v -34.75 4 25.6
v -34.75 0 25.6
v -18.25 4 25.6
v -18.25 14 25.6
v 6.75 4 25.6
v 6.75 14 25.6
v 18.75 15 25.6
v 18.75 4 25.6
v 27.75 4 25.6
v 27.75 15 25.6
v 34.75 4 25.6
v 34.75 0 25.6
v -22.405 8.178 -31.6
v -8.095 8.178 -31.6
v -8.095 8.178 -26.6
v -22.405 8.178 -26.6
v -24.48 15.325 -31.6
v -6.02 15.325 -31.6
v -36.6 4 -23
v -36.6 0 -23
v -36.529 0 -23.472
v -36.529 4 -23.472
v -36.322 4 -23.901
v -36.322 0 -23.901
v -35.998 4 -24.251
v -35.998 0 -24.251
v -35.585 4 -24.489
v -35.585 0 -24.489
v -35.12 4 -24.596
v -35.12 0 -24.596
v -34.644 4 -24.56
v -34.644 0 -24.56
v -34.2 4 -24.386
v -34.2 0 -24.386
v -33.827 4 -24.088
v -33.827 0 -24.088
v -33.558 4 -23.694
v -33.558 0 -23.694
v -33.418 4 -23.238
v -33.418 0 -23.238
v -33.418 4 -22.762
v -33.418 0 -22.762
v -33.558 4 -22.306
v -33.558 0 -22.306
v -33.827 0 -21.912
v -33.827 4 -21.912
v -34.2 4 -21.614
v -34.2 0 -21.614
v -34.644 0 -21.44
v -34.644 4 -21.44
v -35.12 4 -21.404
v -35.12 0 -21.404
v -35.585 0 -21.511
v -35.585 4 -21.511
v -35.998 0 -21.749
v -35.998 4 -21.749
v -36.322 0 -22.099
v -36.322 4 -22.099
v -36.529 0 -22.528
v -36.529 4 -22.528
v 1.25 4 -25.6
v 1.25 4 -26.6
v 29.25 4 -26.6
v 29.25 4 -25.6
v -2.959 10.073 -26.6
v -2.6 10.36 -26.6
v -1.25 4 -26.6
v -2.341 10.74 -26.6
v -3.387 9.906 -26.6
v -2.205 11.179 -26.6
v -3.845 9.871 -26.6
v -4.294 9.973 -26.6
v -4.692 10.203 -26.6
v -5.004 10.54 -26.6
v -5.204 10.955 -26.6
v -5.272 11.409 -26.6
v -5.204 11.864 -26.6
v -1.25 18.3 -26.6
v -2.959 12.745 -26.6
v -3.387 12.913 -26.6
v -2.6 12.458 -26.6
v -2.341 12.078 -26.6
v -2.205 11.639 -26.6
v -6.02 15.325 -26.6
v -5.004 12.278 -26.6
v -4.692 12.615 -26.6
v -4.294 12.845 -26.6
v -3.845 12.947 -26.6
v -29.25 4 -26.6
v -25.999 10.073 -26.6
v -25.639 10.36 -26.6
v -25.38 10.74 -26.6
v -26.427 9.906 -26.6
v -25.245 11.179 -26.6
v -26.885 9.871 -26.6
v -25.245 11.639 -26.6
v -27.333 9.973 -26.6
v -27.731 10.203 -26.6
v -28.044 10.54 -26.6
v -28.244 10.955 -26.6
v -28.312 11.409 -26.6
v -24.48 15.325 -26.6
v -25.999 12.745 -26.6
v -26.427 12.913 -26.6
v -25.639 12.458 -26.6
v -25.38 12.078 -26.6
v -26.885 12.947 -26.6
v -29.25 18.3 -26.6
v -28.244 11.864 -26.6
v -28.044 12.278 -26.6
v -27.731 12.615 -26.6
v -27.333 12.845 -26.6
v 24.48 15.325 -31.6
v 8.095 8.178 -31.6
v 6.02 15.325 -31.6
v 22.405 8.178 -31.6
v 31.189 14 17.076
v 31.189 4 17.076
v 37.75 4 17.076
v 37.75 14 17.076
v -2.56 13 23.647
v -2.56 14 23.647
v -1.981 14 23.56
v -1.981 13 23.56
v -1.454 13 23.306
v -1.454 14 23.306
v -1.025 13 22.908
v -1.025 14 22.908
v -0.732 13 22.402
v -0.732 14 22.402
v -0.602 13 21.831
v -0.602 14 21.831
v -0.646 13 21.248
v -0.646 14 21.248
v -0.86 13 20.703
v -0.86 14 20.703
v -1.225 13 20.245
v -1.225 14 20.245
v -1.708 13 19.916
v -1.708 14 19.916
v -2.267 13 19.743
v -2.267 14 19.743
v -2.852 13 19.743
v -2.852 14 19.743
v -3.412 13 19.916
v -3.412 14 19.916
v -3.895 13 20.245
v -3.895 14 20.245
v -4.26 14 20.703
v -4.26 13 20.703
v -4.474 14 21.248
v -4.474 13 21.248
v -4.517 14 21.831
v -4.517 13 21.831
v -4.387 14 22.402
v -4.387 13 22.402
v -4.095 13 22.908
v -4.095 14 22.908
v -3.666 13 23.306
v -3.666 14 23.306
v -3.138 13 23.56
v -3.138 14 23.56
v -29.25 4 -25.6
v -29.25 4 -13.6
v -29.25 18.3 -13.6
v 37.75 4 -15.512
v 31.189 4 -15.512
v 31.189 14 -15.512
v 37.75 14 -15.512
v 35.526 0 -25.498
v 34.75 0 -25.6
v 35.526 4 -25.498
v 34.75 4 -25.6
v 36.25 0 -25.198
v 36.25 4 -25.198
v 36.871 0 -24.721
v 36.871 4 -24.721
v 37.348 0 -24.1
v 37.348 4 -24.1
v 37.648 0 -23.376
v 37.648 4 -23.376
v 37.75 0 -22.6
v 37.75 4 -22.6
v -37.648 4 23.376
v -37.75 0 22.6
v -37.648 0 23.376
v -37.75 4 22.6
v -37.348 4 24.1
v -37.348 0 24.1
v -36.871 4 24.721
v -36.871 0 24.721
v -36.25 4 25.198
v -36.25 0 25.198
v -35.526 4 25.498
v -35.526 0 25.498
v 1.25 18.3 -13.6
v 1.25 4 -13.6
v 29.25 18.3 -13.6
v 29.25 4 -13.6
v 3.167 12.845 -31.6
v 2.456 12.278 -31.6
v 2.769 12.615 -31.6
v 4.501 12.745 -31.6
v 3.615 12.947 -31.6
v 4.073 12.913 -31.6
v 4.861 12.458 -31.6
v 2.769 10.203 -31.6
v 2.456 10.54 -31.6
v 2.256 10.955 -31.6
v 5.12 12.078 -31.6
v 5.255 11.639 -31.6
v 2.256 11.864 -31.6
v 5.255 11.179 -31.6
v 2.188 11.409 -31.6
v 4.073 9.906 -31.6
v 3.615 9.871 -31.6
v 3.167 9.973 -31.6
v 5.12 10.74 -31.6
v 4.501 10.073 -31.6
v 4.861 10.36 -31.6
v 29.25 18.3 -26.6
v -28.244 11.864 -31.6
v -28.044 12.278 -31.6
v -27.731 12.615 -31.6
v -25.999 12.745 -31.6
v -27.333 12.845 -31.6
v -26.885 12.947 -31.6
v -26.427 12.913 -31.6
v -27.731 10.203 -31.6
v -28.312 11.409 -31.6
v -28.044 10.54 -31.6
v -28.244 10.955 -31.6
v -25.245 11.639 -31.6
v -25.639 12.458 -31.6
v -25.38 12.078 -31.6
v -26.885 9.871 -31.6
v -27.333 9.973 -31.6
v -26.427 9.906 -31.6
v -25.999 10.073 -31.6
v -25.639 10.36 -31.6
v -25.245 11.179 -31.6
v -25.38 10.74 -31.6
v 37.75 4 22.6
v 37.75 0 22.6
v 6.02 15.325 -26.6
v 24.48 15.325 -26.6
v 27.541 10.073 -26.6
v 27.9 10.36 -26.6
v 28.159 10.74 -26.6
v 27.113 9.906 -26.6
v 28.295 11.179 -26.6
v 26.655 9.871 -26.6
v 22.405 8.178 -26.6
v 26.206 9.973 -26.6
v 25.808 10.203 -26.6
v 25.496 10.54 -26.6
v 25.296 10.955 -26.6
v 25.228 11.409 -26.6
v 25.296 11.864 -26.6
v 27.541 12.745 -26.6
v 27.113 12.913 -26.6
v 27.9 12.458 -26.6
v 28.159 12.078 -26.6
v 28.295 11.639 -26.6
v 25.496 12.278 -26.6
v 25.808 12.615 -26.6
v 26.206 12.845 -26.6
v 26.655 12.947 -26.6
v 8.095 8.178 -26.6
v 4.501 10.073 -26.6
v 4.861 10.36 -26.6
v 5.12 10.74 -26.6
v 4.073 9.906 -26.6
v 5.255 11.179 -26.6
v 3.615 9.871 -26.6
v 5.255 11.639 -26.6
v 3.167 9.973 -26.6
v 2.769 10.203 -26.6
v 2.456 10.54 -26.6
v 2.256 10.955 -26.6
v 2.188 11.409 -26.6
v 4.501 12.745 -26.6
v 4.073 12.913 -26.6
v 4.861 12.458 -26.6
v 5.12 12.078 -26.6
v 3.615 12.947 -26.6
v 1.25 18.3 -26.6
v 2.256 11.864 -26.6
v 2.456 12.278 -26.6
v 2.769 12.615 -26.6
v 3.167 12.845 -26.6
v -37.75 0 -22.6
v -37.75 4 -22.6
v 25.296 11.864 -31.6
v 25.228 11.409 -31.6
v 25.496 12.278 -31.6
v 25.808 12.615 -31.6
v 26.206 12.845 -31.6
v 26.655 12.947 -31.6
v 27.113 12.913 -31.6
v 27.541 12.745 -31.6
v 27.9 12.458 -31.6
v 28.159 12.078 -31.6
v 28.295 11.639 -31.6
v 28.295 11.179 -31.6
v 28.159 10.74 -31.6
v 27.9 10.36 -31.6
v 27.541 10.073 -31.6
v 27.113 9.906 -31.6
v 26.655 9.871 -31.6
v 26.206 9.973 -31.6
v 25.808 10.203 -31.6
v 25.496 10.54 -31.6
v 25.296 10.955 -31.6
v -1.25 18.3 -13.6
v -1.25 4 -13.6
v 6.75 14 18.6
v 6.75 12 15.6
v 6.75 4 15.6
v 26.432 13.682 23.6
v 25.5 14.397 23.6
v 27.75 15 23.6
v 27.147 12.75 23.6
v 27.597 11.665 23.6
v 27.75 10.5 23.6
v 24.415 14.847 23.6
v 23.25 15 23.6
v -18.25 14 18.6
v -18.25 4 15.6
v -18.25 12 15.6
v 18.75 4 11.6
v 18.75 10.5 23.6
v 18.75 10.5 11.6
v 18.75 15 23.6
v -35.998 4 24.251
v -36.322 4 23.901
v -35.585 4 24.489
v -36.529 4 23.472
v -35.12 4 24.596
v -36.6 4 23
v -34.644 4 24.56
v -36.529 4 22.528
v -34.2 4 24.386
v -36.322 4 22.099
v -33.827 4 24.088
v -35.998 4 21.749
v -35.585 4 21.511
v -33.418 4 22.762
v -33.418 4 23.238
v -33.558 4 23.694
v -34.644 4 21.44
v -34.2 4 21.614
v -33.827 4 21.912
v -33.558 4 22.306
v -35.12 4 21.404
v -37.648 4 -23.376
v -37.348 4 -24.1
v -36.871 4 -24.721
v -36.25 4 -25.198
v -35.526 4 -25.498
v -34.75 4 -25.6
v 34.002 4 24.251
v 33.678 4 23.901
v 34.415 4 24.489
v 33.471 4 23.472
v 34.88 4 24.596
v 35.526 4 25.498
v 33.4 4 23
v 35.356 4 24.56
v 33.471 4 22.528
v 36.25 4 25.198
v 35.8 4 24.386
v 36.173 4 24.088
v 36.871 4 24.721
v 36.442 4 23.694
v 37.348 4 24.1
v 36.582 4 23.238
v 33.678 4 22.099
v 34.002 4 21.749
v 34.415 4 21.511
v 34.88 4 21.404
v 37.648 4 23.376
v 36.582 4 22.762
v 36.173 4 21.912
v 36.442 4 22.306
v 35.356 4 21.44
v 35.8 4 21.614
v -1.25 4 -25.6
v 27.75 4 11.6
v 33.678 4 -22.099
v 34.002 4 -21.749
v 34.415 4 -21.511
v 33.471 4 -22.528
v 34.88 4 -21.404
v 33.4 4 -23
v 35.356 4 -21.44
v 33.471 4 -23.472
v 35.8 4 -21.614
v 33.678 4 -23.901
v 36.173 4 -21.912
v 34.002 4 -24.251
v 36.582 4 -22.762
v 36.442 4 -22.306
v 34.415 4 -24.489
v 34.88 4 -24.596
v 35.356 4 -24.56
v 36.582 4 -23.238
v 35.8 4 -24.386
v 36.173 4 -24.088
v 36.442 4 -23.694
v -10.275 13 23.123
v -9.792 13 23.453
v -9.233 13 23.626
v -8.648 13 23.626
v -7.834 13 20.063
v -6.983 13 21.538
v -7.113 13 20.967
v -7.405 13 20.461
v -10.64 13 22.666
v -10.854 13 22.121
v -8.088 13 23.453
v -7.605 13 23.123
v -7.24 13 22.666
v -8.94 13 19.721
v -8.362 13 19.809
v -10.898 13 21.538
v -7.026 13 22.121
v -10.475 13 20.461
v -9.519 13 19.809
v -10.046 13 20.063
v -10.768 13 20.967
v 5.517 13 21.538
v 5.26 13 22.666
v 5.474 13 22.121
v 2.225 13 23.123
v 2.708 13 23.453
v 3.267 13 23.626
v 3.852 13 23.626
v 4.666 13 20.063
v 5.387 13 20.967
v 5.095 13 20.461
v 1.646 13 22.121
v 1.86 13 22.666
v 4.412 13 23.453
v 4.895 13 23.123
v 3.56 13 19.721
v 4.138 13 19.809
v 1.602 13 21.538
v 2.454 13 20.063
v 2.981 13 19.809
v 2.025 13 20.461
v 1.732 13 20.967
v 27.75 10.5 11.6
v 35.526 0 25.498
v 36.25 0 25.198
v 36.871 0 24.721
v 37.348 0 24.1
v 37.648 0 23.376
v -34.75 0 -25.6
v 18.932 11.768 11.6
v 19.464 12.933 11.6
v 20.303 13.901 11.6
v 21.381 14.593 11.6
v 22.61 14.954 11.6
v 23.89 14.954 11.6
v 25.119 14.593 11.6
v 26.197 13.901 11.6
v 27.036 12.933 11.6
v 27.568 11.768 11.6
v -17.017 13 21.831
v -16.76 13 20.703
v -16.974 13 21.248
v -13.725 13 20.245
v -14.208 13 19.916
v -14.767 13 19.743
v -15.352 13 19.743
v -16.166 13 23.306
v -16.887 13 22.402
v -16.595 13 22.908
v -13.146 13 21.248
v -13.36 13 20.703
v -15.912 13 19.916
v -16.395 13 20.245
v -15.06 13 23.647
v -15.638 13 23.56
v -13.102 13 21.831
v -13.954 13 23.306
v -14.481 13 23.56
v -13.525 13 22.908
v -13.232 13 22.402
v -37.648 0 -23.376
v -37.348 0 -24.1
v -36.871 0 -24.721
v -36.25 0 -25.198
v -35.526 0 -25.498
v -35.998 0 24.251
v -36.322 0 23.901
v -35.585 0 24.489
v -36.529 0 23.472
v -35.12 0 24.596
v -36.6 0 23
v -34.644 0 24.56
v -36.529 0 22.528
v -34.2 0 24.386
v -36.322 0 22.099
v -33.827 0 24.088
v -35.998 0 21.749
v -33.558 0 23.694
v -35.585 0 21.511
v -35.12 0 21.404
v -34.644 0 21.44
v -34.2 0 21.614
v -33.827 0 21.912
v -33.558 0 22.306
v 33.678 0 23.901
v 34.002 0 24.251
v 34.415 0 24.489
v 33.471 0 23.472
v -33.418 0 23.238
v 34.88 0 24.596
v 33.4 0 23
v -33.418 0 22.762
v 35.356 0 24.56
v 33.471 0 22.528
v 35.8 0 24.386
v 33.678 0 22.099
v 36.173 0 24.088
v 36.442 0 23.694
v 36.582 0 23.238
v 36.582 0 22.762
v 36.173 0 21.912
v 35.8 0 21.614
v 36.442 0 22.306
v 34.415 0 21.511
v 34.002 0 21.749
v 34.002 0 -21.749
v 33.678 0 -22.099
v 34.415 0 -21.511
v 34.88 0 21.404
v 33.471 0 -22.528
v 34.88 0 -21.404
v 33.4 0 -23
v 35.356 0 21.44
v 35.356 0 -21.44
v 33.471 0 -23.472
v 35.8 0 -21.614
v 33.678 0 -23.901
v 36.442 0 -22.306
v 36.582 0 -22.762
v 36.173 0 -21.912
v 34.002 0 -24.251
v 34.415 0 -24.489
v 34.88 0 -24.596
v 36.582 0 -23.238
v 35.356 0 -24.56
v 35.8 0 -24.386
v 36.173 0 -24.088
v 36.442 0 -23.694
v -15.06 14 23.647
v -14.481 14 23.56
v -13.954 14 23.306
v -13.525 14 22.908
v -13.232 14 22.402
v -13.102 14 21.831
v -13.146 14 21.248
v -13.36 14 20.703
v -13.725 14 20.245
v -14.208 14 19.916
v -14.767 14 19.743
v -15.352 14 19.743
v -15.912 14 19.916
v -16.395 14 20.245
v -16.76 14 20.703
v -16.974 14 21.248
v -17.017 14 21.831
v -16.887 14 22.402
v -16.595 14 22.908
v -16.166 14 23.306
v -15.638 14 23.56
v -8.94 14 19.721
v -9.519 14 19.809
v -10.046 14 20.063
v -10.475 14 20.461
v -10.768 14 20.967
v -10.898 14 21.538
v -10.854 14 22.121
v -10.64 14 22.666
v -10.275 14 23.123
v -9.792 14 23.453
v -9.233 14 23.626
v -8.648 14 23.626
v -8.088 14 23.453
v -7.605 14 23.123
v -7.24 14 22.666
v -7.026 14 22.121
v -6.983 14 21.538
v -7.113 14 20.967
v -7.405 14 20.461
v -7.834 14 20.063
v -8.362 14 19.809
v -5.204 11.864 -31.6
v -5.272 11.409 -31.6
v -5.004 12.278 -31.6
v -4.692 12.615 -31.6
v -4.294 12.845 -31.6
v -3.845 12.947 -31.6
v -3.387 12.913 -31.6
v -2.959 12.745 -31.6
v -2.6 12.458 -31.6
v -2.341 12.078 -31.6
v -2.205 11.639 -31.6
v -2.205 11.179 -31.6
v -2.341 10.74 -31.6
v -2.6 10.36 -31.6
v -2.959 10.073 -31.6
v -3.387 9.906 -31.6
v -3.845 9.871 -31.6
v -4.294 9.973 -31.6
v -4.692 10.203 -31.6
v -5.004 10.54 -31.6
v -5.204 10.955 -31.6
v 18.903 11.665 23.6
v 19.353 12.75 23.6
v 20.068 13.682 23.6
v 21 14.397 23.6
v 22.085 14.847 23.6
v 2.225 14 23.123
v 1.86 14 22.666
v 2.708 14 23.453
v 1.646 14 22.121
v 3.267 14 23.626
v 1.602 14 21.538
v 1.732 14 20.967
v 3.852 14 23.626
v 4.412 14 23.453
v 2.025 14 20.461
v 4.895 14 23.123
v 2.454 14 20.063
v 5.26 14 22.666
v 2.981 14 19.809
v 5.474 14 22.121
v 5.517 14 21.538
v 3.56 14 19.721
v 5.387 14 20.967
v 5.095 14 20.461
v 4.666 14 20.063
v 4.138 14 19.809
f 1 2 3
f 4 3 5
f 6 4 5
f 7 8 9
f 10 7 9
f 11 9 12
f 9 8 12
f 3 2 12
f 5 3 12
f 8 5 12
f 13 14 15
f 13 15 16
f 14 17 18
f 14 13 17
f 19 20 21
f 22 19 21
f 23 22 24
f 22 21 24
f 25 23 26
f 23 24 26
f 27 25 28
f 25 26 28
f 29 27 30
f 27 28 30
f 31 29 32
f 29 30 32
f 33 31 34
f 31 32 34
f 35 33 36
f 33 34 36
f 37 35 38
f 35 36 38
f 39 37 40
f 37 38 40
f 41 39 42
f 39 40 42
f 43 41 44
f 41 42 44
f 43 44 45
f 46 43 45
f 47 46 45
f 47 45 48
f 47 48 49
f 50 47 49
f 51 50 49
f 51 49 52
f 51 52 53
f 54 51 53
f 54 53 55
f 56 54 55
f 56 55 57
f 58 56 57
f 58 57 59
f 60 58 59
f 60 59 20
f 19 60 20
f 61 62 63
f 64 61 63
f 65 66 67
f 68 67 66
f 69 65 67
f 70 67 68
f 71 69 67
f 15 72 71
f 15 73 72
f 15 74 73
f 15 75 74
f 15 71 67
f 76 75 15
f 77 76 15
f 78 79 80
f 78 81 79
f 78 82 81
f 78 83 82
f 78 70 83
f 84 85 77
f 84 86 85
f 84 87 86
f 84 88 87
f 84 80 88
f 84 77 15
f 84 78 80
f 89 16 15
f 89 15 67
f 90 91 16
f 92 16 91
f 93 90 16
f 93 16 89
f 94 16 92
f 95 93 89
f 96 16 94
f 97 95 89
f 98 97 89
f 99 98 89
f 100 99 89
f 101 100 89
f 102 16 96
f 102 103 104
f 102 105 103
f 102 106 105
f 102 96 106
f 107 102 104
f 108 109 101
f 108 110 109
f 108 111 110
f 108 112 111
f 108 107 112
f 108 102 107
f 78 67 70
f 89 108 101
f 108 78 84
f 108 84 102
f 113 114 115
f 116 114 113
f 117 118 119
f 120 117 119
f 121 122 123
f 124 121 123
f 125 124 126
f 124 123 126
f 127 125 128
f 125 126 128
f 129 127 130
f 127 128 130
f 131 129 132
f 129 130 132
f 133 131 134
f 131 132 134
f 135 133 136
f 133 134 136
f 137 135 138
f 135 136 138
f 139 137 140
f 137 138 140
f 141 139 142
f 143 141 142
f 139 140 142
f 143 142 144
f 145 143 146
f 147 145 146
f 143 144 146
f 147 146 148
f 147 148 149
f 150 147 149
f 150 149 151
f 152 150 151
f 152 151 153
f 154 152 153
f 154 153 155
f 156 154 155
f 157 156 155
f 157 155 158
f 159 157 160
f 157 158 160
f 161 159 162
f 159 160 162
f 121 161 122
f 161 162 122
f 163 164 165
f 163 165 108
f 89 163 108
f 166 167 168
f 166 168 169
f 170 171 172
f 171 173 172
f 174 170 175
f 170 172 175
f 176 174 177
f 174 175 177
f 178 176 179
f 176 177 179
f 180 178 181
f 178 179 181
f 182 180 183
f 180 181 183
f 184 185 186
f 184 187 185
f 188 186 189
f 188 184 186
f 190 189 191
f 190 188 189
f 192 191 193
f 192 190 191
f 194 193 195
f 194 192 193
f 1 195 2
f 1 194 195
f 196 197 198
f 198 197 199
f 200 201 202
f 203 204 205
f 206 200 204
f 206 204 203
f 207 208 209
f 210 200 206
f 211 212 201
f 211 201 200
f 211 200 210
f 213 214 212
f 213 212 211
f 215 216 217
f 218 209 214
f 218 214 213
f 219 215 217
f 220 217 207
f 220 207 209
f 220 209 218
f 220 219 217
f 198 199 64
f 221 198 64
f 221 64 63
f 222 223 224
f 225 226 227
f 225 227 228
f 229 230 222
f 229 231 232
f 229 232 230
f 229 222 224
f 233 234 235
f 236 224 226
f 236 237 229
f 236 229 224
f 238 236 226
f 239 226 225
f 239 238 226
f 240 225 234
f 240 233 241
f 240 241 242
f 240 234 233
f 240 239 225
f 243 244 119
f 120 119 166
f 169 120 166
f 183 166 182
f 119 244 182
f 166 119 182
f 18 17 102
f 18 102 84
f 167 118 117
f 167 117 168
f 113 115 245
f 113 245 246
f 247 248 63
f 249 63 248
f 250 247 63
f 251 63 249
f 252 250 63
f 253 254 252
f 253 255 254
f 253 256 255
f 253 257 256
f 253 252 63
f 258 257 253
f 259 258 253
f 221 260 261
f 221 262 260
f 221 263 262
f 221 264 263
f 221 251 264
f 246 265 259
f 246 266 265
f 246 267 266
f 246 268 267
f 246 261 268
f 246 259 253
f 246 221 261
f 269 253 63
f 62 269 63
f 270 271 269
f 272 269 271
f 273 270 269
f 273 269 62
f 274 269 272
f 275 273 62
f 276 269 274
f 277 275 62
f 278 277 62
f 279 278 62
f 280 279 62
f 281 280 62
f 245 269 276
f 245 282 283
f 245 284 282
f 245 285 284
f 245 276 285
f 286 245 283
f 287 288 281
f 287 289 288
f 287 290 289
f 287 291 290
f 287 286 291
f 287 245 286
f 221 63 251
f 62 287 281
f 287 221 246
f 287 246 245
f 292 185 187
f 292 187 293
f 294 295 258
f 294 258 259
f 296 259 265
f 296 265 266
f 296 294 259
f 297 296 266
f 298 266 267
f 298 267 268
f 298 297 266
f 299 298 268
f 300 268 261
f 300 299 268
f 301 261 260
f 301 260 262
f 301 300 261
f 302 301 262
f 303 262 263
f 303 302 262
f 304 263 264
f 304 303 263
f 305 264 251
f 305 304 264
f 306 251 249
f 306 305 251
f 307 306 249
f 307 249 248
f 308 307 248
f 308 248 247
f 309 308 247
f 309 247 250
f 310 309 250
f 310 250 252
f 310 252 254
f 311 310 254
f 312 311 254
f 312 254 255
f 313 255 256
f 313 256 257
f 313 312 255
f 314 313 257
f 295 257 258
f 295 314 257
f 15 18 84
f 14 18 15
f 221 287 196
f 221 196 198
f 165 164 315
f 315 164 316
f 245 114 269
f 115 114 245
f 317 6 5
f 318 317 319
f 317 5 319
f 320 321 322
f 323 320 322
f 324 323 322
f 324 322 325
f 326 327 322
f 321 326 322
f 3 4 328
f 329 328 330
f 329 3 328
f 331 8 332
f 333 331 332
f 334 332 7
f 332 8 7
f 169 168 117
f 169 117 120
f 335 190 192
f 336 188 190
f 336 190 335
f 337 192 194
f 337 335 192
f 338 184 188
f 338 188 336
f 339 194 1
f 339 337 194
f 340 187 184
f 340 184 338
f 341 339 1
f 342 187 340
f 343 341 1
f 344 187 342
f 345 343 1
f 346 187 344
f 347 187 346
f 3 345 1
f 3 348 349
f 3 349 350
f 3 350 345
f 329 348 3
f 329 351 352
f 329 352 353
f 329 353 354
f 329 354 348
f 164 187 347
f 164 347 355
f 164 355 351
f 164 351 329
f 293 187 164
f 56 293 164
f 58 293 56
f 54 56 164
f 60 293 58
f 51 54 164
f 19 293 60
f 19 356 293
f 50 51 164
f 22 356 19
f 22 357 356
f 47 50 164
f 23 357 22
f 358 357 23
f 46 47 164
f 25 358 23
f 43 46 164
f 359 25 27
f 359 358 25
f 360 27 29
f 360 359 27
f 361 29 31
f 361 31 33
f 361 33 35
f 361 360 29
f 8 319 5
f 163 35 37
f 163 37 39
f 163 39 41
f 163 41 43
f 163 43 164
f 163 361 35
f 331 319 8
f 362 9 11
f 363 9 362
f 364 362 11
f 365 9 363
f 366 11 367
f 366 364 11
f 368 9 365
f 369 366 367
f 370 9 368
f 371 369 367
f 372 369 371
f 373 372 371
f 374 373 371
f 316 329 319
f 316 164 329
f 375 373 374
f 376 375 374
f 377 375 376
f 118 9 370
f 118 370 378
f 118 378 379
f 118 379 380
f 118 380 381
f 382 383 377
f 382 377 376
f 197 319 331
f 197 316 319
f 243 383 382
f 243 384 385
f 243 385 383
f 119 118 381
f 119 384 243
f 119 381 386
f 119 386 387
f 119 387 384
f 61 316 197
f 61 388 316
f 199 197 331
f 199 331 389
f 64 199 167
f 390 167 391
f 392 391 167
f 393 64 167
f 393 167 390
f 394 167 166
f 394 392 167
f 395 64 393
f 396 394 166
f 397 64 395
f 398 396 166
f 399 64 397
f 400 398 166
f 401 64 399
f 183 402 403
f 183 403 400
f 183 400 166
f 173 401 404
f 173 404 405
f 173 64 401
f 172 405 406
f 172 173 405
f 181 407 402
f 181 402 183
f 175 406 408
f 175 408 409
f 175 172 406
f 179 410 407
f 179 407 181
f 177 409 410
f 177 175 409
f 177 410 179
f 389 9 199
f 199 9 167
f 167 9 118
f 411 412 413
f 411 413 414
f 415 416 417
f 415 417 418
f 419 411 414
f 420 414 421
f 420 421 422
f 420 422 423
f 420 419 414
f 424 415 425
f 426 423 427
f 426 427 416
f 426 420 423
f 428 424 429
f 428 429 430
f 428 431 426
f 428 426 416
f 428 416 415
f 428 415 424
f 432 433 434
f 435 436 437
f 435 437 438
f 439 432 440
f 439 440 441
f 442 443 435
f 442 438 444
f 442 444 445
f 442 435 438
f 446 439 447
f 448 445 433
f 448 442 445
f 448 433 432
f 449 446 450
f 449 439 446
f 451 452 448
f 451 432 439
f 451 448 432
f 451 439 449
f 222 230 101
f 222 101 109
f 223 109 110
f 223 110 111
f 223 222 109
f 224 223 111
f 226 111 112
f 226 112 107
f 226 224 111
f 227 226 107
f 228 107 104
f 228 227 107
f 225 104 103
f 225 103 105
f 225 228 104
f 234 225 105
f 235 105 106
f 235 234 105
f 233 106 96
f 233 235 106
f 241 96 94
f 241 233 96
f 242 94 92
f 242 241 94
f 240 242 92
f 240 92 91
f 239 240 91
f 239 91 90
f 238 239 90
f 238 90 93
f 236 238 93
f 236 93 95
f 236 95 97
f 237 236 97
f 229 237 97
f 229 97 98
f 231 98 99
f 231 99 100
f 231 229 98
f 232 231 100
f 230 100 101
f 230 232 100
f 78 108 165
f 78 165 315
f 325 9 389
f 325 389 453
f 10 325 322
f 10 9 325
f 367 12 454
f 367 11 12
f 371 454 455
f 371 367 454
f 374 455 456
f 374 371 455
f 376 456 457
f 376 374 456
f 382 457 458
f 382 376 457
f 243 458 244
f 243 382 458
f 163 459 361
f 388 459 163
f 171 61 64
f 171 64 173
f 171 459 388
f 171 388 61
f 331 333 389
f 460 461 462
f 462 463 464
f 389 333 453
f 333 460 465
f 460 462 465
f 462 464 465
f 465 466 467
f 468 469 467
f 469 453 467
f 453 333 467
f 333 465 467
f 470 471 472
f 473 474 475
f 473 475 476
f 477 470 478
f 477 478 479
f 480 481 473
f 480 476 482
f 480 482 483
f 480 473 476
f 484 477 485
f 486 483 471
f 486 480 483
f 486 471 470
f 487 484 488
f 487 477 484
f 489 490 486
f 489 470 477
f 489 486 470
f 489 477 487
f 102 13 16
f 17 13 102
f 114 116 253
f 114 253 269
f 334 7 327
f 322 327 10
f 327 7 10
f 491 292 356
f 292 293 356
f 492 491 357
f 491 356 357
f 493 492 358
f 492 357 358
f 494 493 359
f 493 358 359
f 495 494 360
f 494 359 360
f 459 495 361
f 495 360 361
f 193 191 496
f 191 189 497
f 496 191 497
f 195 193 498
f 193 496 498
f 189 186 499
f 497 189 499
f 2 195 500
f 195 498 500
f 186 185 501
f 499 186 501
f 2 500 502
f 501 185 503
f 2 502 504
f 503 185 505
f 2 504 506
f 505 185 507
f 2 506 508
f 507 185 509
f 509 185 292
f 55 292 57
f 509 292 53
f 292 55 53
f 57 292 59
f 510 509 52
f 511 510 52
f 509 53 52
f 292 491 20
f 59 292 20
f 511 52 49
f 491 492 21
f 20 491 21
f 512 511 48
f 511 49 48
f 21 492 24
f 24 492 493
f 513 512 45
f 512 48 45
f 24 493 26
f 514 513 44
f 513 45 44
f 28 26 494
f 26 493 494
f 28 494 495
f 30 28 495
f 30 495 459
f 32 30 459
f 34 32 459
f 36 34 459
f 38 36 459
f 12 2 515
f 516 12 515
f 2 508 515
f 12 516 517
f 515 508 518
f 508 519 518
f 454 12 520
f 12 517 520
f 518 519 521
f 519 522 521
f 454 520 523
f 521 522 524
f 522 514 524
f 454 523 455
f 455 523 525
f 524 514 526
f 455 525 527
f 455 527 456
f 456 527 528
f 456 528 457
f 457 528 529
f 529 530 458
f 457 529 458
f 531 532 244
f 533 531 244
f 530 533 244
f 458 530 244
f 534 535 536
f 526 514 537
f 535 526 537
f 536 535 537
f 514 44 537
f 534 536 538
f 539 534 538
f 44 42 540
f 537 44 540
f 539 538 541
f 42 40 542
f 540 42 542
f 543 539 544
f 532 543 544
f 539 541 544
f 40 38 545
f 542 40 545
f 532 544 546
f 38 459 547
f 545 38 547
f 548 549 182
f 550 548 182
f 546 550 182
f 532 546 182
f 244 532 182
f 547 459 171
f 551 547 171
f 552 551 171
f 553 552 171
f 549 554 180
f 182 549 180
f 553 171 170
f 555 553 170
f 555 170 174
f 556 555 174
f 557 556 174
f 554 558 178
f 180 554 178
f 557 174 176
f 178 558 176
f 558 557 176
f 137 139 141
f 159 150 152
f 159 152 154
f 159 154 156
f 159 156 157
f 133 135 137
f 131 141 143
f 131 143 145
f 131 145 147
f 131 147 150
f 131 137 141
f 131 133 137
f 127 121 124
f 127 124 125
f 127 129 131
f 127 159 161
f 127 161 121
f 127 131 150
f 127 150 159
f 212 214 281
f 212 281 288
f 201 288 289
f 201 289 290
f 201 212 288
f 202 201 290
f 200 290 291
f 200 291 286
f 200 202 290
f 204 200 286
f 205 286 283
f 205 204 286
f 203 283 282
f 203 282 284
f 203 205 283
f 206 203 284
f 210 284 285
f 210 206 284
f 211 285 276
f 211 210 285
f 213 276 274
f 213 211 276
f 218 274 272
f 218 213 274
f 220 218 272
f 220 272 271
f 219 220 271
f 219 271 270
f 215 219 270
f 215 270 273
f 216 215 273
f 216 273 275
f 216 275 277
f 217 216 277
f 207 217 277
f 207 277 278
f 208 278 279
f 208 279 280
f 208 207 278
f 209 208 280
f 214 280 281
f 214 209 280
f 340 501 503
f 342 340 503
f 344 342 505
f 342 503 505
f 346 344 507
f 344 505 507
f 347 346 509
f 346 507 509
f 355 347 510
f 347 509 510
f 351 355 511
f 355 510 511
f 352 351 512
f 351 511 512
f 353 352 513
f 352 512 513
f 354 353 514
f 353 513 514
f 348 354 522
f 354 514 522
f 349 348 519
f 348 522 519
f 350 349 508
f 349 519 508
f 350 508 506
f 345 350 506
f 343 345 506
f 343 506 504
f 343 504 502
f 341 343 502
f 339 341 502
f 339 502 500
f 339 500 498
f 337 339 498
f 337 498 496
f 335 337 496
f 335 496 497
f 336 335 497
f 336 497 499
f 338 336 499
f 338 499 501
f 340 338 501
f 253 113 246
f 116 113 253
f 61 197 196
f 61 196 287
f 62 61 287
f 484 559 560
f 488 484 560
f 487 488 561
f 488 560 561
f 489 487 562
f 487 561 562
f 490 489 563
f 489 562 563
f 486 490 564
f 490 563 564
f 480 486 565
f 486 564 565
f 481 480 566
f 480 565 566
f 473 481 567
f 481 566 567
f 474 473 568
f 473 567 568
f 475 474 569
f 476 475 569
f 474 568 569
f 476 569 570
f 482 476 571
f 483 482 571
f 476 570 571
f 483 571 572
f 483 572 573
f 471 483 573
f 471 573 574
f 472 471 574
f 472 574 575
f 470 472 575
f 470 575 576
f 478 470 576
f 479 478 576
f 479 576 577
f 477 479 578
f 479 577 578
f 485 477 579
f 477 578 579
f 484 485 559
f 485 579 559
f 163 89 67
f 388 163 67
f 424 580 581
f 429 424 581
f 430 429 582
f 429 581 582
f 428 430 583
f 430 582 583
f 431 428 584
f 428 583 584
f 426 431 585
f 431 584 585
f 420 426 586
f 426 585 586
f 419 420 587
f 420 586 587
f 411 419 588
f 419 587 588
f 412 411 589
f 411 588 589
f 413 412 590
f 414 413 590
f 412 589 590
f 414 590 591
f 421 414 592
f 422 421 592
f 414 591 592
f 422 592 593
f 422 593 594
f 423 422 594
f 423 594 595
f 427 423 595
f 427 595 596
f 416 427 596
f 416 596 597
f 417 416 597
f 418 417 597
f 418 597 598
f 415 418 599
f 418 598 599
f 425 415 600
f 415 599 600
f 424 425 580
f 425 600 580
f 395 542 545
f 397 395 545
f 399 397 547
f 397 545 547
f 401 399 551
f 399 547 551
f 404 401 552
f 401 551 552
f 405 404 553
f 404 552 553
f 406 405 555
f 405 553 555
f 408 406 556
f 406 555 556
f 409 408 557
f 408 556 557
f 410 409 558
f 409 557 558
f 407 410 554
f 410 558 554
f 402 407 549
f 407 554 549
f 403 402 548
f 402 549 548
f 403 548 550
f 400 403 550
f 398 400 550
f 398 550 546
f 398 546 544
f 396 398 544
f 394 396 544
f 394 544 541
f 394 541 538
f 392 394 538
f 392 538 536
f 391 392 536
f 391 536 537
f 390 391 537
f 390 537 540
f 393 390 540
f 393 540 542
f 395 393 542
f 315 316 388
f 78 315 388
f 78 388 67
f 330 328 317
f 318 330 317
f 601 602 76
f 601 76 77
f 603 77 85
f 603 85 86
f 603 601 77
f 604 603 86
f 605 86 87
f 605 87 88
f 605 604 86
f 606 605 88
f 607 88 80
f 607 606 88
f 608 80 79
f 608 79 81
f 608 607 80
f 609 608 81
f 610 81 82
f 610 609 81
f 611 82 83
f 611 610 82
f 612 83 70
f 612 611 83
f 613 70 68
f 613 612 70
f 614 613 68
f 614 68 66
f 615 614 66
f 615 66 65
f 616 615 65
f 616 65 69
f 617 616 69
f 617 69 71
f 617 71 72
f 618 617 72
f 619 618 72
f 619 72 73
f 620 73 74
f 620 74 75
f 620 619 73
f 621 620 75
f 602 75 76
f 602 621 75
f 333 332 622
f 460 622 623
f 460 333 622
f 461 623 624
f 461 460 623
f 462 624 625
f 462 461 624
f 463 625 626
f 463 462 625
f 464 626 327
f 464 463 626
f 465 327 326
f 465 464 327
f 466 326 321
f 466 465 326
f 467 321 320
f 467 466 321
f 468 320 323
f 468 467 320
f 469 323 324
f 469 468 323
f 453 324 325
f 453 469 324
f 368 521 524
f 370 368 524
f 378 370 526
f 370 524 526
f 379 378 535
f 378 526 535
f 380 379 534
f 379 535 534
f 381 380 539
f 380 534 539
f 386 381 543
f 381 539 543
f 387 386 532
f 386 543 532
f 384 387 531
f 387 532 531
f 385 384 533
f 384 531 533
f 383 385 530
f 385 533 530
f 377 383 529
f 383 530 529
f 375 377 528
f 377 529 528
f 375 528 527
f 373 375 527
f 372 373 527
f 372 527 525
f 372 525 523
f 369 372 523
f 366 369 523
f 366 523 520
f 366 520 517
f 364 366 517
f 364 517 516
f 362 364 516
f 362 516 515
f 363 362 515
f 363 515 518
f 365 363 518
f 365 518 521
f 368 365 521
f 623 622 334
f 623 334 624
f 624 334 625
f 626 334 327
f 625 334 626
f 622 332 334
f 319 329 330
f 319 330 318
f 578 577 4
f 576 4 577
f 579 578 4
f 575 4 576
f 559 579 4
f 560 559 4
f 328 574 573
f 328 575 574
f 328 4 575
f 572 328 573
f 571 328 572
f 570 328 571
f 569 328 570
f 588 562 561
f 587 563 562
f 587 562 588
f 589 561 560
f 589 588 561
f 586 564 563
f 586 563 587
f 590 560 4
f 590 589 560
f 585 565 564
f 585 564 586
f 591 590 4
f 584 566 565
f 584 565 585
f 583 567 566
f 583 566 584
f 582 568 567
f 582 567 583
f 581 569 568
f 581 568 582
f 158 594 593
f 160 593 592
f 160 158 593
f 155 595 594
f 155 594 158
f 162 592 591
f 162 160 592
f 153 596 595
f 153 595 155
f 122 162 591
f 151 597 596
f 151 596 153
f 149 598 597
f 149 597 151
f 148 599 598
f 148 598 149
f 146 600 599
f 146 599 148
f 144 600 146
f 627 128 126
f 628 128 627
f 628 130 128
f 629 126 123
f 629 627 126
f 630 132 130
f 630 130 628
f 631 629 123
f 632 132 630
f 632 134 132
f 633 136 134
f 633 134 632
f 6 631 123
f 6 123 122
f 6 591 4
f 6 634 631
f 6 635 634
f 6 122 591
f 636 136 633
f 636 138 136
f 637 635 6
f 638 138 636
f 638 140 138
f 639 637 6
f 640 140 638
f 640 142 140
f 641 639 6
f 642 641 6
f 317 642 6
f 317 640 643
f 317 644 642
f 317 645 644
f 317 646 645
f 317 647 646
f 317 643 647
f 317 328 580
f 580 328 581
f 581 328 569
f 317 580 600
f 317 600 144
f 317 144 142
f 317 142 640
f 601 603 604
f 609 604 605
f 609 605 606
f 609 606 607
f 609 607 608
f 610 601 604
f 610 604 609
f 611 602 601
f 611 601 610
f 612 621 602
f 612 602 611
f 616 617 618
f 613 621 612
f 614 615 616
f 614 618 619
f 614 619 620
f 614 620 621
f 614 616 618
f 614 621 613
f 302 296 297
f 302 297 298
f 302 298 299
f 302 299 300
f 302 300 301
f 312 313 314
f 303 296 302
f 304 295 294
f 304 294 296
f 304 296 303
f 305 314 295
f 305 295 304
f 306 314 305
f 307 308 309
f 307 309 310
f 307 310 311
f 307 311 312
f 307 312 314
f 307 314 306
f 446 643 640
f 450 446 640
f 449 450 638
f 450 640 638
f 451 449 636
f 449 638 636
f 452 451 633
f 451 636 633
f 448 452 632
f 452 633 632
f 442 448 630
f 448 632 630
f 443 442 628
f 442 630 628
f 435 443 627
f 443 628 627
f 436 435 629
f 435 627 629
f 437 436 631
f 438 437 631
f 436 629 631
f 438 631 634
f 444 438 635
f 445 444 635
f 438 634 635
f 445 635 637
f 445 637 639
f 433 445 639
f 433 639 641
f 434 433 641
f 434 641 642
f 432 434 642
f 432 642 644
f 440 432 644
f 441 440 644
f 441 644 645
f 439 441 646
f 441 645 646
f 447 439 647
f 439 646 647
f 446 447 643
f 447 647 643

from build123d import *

# Parameters (mm, degrees)
SKETCH_1_W          = 75.5
SKETCH_1_H          = 51.2
EXTRUDE_1_DEPTH     = 4
HOLE_WIZARD_M3_1_D  = 3.2
FILLET_1_R          = 3
SKETCH_4_W          = 9
SKETCH_4_H          = 11
EXTRUDE_2_DEPTH     = 14
CUT_EXTRUDE_1_DEPTH = 12
SKETCH_6_W          = 25
SKETCH_6_H          = 10
EXTRUDE_3_DEPTH     = 10
SKETCH_7_R          = 1.963016799
CUT_EXTRUDE_2_DEPTH = 1
CHAMFER_1_SIZE      = 2
CHAMFER_1_SIZE2     = 3
SKETCH_8_W          = 6.560594773
SKETCH_8_H          = 32.588402295
EXTRUDE_4_DEPTH     = 10
SKETCH_9_W          = 28
SKETCH_9_H          = 18
EXTRUDE_5_DEPTH     = 14.3
SKETCH_10_W         = 28
SKETCH_10_H         = 14.3
SKETCH_10_R         = 1.542197262
CUT_EXTRUDE_3_DEPTH = 5


with BuildPart() as part:
    # 草图1 → 凸台-拉伸1 (new body)
    with BuildSketch(Plane(origin=(0, 0, 0), x_dir=(1, 0, 0), z_dir=(0, 1, 0))):
        Rectangle(SKETCH_1_W, SKETCH_1_H)
    extrude(amount=EXTRUDE_1_DEPTH)

    # M3 间隙孔1 (through all)
    with Locations(Plane(origin=(0, 4, 0), x_dir=(1, 0, 0), z_dir=(0, 1, 0))):
        with Locations((-35, 23), (35, 23), (-35, -23), (35, -23)):
            Hole(HOLE_WIZARD_M3_1_D / 2)

    # 圆角1
    fillet_1_edges = [part.edges().sort_by_distance(p)[0] for p in [
        (-37.75, 2, -25.6),
        (37.75, 2, -25.6),
        (37.75, 2, 25.6),
        (-37.75, 2, 25.6),
    ]]
    fillet(fillet_1_edges, radius=FILLET_1_R)

    # 草图4 → 凸台-拉伸2 (add)
    with BuildSketch(Plane.XY.offset(25.6)):
        with Locations((23.25, 9.5)):
            Rectangle(SKETCH_4_W, SKETCH_4_H)
    extrude(amount=-EXTRUDE_2_DEPTH)

    # 草图5 → 切除-拉伸1 (cut)
    with BuildSketch(Plane(origin=(0, 0, 11.6), x_dir=(-1, 0, 0), z_dir=(0, 0, -1))):
        with BuildLine():
            Line((-27.75, 10.5), (-28.75, 10.5))
            Line((-28.75, 10.5), (-28.75, 16))
            Line((-28.75, 16), (-17.75, 16))
            Line((-17.75, 16), (-17.75, 10.5))
            Line((-17.75, 10.5), (-18.75, 10.5))
            ThreePointArc((-18.75, 10.5), (-23.25, 15), (-27.75, 10.5))
        make_face()
    extrude(amount=-CUT_EXTRUDE_1_DEPTH, mode=Mode.SUBTRACT)

    # 草图6 → 凸台-拉伸3 (add)
    with BuildSketch(Plane(origin=(0, 4, 0), x_dir=(1, 0, 0), z_dir=(0, 1, 0))):
        with Locations((-5.75, -20.6)):
            Rectangle(SKETCH_6_W, SKETCH_6_H)
    extrude(amount=EXTRUDE_3_DEPTH)

    # 草图7 → 切除-拉伸2 (cut)
    with BuildSketch(Plane(origin=(0, 14, 0), x_dir=(1, 0, 0), z_dir=(0, 1, 0))):
        with Locations(Location((-15.05979197, -21.684454558, 0), (0, 0, 270))):
            Circle(SKETCH_7_R)
        with Locations(Location((-8.94020803, -21.684454558, 0), (0, 0, 90))):
            Circle(SKETCH_7_R)
        with Locations(Location((3.55979197, -21.684454558, 0), (0, 0, 90))):
            Circle(SKETCH_7_R)
        with Locations(Location((-2.55979197, -21.684454558, 0), (0, 0, 270))):
            Circle(SKETCH_7_R)
    extrude(amount=-CUT_EXTRUDE_2_DEPTH, mode=Mode.SUBTRACT)

    # 倒角1
    chamfer_1_edges = [part.edges().sort_by_distance(p)[0] for p in [
        (-5.75, 14, 15.6),
    ]]
    chamfer_1_side = [part.faces().sort_by_distance(p)[0] for p in [
        (-5.75, 9, 15.6),
    ]]
    chamfer(chamfer_1_edges, length=CHAMFER_1_SIZE, length2=CHAMFER_1_SIZE2, reference=chamfer_1_side[0])

    # 草图8 → 凸台-拉伸4 (add)
    with BuildSketch(Plane(origin=(0, 4, 0), x_dir=(1, 0, 0), z_dir=(0, 1, 0))):
        with Locations((34.469702614, -0.78179248)):
            Rectangle(SKETCH_8_W, SKETCH_8_H)
    extrude(amount=EXTRUDE_4_DEPTH)

    # 草图9 → 凸台-拉伸5 (add)
    with BuildSketch(Plane(origin=(0, 4, 0), x_dir=(1, 0, 0), z_dir=(0, 1, 0))):
        with Locations((-15.25, 22.6)):
            Rectangle(SKETCH_9_W, SKETCH_9_H)
        with Locations((15.25, 22.6)):
            Rectangle(SKETCH_9_W, SKETCH_9_H)
    extrude(amount=EXTRUDE_5_DEPTH)

    # 草图10 → 切除-拉伸3 (cut)
    # profile 1 of 2: a face of its own
    with BuildSketch(Plane(origin=(0, 0, -31.6), x_dir=(-1, 0, 0), z_dir=(0, 0, -1))):
        with Locations((-15.25, 11.15)):
            Rectangle(SKETCH_10_W, SKETCH_10_H)
        with Locations((-26.769914648, 11.409080509)):
            Circle(SKETCH_10_R, mode=Mode.SUBTRACT)
        with Locations((-3.730085352, 11.409080509)):
            Circle(SKETCH_10_R, mode=Mode.SUBTRACT)
        Polygon((-22.404607637, 8.177619476), (-8.095392363, 8.177619476), (-6.020301502, 15.325154661), (-24.479698498, 15.325154661), align=None, mode=Mode.SUBTRACT)
    # profile 2 of 2: a face of its own
    with BuildSketch(Plane(origin=(0, 0, -31.6), x_dir=(-1, 0, 0), z_dir=(0, 0, -1))):
        with Locations((15.25, 11.15)):
            Rectangle(SKETCH_10_W, SKETCH_10_H)
        with Locations((3.730085352, 11.409080509)):
            Circle(SKETCH_10_R, mode=Mode.SUBTRACT)
        with Locations((26.769914648, 11.409080509)):
            Circle(SKETCH_10_R, mode=Mode.SUBTRACT)
        Polygon((6.020301502, 15.325154661), (8.095392363, 8.177619476), (22.404607637, 8.177619476), (24.479698498, 15.325154661), align=None, mode=Mode.SUBTRACT)
    extrude(amount=-CUT_EXTRUDE_3_DEPTH, mode=Mode.SUBTRACT)


solid = part.part
